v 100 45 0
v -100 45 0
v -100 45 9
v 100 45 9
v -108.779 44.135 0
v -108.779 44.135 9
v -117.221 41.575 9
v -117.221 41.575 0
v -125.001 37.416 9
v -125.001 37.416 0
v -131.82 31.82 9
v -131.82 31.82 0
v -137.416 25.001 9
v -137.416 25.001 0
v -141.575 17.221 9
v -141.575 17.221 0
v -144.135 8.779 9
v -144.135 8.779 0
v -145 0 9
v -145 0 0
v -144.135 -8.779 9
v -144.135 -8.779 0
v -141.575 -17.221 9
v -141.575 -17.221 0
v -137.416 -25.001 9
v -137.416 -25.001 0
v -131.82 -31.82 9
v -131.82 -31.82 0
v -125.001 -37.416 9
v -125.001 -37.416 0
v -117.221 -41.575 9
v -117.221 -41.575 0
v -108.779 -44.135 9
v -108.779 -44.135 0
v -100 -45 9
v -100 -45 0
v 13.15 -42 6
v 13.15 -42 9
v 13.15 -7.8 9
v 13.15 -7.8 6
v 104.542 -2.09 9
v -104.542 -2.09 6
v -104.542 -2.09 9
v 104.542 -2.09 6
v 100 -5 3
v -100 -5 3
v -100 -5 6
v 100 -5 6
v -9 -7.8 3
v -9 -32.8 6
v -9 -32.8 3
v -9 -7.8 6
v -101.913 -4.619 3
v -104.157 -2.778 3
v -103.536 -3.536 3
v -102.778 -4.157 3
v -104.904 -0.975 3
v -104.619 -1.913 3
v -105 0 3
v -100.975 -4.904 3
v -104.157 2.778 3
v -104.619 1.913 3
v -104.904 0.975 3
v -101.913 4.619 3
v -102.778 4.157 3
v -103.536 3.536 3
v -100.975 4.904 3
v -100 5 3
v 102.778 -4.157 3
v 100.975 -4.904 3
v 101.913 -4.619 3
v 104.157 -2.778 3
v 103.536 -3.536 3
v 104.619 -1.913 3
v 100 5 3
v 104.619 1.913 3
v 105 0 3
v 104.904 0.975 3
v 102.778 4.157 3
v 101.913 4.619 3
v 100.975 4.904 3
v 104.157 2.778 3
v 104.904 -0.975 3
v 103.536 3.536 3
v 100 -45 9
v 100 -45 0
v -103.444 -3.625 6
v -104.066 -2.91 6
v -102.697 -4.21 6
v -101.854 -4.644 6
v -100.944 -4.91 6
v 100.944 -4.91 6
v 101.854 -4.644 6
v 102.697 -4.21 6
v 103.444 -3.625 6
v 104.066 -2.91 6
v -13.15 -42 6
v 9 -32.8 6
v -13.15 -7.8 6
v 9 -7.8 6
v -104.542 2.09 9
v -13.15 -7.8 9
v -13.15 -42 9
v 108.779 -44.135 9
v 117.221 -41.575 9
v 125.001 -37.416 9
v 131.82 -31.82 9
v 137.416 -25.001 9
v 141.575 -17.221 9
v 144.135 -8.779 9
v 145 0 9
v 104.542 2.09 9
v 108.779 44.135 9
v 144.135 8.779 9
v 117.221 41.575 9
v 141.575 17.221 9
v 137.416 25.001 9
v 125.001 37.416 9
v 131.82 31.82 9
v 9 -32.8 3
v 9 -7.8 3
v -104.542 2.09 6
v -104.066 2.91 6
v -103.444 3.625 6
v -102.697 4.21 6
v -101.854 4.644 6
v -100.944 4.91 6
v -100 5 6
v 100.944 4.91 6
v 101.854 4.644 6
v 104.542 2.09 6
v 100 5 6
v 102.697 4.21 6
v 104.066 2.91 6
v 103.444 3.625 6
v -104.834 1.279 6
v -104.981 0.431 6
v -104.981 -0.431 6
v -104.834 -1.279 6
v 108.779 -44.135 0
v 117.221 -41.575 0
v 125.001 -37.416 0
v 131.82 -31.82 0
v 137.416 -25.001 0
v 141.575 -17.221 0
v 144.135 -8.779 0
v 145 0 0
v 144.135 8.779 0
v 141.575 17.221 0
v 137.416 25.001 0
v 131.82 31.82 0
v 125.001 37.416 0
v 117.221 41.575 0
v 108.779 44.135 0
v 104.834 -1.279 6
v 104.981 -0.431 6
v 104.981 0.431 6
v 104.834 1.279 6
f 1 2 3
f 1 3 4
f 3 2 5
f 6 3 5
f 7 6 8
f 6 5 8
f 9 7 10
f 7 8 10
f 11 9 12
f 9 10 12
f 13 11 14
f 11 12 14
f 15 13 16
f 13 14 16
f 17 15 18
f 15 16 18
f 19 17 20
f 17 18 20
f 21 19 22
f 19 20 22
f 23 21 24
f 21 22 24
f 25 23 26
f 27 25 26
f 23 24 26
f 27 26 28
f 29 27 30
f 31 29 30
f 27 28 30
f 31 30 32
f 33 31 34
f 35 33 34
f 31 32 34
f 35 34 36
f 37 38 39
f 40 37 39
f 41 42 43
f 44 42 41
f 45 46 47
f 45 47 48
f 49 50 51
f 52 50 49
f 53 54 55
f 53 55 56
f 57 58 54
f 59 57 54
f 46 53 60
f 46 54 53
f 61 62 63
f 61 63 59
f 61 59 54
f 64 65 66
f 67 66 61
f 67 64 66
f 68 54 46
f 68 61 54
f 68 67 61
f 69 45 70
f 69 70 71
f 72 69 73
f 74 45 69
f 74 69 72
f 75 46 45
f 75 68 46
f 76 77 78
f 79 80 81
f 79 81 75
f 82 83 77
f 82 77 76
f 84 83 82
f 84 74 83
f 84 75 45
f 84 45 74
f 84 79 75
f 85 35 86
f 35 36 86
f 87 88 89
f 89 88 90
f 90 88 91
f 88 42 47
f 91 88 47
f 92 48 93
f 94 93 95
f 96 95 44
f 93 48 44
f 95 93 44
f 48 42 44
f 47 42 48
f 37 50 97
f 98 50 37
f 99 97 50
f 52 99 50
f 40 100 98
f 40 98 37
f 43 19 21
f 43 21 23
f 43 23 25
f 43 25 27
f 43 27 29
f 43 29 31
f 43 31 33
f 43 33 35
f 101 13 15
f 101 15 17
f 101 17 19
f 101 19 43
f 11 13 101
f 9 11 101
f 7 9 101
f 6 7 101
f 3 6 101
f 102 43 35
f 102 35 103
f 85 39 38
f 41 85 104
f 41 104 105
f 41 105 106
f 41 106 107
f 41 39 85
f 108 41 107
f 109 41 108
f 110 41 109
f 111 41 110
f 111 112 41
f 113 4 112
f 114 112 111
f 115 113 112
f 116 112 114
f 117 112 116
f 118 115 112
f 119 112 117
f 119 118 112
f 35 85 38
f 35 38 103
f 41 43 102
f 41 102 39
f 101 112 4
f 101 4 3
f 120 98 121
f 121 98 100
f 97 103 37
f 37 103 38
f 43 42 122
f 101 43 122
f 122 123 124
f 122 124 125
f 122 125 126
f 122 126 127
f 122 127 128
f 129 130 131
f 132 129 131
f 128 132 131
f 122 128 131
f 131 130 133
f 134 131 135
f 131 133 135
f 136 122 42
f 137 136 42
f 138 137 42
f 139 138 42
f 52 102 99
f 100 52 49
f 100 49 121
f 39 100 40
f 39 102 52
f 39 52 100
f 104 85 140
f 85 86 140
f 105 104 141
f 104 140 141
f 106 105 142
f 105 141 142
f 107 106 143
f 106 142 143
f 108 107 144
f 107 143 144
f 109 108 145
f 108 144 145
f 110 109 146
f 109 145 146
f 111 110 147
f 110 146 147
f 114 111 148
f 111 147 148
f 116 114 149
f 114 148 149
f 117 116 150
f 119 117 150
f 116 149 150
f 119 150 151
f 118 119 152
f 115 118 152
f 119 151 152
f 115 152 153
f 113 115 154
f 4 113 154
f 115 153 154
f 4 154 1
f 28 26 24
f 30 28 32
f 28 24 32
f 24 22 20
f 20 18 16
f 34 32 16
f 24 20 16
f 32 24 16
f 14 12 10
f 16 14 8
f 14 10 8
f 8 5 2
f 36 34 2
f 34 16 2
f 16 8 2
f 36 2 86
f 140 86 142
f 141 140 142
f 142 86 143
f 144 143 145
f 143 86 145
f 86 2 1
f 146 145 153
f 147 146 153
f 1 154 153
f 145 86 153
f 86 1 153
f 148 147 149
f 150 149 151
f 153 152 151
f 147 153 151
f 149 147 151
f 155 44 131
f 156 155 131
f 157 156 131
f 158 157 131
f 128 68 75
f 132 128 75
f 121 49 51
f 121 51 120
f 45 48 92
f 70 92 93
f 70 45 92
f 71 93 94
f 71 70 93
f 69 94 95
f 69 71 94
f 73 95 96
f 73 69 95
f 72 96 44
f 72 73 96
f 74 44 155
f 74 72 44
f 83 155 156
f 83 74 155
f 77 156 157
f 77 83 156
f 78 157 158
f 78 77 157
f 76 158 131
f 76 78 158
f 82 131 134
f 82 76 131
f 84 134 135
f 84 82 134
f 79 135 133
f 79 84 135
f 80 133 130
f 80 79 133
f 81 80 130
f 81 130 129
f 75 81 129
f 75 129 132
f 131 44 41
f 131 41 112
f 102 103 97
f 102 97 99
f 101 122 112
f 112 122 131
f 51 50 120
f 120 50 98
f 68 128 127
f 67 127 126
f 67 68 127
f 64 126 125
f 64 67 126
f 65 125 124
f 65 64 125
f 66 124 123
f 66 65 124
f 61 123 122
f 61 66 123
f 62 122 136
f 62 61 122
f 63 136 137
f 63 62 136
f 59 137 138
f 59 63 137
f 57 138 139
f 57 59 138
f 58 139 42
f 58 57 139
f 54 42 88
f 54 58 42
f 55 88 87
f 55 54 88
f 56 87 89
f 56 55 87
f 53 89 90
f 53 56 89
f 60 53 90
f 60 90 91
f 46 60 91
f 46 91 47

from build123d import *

# Parameters (mm, degrees)
PAD_DEPTH       = 3
PAD001_DEPTH    = 3
SKETCH002_W     = 209.08447
SKETCH002_H     = 4.18
PAD002_DEPTH    = 3
SKETCH003_W     = 26.3
SKETCH003_H     = 34.2
POCKET_DEPTH    = 3
SKETCH004_W     = 18
SKETCH004_H     = 25
POCKET001_DEPTH = 3


with BuildPart() as part:
    # Sketch → Pad (new body)
    with BuildSketch(Plane.XY):
        with BuildLine():
            ThreePointArc((-100, 45), (-145, 0), (-100, -45))
            Line((-100, -45), (100, -45))
            ThreePointArc((100, -45), (145, 0), (100, 45))
            Line((-100, 45), (100, 45))
        make_face()
    extrude(amount=PAD_DEPTH)

    # Sketch001 (on Face6 of Pad) → Pad001 (join)
    with BuildSketch(Plane.XY.offset(3)):
        with BuildLine():
            ThreePointArc((-100, 45), (-145, 0), (-100, -45))
            Line((-100, -45), (100, -45))
            ThreePointArc((100, -45), (145, 0), (100, 45))
            Line((-100, 45), (100, 45))
        make_face()
        with BuildLine():
            ThreePointArc((-100, 5), (-105, 0), (-100, -5))
            Line((-100, -5), (100, -5))
            ThreePointArc((100, -5), (105, 0), (100, 5))
            Line((-100, 5), (100, 5))
        make_face(mode=Mode.SUBTRACT)
    extrude(amount=PAD001_DEPTH)

    # Sketch002 (on Face9 of Pad001) → Pad002 (join)
    with BuildSketch(Plane.XY.offset(6)):
        with BuildLine():
            ThreePointArc((-100, 45), (-145, 0), (-100, -45))
            Line((-100, -45), (100, -45))
            ThreePointArc((100, -45), (145, 0), (100, 45))
            Line((-100, 45), (100, 45))
        make_face()
        Rectangle(SKETCH002_W, SKETCH002_H, mode=Mode.SUBTRACT)
    extrude(amount=PAD002_DEPTH)

    # Sketch003 (on Face13 of Pad002) → Pocket (cut)
    with BuildSketch(Plane.XY.offset(9)):
        with Locations((0, -24.9)):
            Rectangle(SKETCH003_W, SKETCH003_H)
    extrude(amount=-POCKET_DEPTH, mode=Mode.SUBTRACT)

    # Sketch004 (on Face27 of Pocket) → Pocket001 (cut)
    with BuildSketch(Plane.XY.offset(6)):
        with Locations((0, -20.3)):
            Rectangle(SKETCH004_W, SKETCH004_H)
    extrude(amount=-POCKET001_DEPTH, mode=Mode.SUBTRACT)


solid = part.part
